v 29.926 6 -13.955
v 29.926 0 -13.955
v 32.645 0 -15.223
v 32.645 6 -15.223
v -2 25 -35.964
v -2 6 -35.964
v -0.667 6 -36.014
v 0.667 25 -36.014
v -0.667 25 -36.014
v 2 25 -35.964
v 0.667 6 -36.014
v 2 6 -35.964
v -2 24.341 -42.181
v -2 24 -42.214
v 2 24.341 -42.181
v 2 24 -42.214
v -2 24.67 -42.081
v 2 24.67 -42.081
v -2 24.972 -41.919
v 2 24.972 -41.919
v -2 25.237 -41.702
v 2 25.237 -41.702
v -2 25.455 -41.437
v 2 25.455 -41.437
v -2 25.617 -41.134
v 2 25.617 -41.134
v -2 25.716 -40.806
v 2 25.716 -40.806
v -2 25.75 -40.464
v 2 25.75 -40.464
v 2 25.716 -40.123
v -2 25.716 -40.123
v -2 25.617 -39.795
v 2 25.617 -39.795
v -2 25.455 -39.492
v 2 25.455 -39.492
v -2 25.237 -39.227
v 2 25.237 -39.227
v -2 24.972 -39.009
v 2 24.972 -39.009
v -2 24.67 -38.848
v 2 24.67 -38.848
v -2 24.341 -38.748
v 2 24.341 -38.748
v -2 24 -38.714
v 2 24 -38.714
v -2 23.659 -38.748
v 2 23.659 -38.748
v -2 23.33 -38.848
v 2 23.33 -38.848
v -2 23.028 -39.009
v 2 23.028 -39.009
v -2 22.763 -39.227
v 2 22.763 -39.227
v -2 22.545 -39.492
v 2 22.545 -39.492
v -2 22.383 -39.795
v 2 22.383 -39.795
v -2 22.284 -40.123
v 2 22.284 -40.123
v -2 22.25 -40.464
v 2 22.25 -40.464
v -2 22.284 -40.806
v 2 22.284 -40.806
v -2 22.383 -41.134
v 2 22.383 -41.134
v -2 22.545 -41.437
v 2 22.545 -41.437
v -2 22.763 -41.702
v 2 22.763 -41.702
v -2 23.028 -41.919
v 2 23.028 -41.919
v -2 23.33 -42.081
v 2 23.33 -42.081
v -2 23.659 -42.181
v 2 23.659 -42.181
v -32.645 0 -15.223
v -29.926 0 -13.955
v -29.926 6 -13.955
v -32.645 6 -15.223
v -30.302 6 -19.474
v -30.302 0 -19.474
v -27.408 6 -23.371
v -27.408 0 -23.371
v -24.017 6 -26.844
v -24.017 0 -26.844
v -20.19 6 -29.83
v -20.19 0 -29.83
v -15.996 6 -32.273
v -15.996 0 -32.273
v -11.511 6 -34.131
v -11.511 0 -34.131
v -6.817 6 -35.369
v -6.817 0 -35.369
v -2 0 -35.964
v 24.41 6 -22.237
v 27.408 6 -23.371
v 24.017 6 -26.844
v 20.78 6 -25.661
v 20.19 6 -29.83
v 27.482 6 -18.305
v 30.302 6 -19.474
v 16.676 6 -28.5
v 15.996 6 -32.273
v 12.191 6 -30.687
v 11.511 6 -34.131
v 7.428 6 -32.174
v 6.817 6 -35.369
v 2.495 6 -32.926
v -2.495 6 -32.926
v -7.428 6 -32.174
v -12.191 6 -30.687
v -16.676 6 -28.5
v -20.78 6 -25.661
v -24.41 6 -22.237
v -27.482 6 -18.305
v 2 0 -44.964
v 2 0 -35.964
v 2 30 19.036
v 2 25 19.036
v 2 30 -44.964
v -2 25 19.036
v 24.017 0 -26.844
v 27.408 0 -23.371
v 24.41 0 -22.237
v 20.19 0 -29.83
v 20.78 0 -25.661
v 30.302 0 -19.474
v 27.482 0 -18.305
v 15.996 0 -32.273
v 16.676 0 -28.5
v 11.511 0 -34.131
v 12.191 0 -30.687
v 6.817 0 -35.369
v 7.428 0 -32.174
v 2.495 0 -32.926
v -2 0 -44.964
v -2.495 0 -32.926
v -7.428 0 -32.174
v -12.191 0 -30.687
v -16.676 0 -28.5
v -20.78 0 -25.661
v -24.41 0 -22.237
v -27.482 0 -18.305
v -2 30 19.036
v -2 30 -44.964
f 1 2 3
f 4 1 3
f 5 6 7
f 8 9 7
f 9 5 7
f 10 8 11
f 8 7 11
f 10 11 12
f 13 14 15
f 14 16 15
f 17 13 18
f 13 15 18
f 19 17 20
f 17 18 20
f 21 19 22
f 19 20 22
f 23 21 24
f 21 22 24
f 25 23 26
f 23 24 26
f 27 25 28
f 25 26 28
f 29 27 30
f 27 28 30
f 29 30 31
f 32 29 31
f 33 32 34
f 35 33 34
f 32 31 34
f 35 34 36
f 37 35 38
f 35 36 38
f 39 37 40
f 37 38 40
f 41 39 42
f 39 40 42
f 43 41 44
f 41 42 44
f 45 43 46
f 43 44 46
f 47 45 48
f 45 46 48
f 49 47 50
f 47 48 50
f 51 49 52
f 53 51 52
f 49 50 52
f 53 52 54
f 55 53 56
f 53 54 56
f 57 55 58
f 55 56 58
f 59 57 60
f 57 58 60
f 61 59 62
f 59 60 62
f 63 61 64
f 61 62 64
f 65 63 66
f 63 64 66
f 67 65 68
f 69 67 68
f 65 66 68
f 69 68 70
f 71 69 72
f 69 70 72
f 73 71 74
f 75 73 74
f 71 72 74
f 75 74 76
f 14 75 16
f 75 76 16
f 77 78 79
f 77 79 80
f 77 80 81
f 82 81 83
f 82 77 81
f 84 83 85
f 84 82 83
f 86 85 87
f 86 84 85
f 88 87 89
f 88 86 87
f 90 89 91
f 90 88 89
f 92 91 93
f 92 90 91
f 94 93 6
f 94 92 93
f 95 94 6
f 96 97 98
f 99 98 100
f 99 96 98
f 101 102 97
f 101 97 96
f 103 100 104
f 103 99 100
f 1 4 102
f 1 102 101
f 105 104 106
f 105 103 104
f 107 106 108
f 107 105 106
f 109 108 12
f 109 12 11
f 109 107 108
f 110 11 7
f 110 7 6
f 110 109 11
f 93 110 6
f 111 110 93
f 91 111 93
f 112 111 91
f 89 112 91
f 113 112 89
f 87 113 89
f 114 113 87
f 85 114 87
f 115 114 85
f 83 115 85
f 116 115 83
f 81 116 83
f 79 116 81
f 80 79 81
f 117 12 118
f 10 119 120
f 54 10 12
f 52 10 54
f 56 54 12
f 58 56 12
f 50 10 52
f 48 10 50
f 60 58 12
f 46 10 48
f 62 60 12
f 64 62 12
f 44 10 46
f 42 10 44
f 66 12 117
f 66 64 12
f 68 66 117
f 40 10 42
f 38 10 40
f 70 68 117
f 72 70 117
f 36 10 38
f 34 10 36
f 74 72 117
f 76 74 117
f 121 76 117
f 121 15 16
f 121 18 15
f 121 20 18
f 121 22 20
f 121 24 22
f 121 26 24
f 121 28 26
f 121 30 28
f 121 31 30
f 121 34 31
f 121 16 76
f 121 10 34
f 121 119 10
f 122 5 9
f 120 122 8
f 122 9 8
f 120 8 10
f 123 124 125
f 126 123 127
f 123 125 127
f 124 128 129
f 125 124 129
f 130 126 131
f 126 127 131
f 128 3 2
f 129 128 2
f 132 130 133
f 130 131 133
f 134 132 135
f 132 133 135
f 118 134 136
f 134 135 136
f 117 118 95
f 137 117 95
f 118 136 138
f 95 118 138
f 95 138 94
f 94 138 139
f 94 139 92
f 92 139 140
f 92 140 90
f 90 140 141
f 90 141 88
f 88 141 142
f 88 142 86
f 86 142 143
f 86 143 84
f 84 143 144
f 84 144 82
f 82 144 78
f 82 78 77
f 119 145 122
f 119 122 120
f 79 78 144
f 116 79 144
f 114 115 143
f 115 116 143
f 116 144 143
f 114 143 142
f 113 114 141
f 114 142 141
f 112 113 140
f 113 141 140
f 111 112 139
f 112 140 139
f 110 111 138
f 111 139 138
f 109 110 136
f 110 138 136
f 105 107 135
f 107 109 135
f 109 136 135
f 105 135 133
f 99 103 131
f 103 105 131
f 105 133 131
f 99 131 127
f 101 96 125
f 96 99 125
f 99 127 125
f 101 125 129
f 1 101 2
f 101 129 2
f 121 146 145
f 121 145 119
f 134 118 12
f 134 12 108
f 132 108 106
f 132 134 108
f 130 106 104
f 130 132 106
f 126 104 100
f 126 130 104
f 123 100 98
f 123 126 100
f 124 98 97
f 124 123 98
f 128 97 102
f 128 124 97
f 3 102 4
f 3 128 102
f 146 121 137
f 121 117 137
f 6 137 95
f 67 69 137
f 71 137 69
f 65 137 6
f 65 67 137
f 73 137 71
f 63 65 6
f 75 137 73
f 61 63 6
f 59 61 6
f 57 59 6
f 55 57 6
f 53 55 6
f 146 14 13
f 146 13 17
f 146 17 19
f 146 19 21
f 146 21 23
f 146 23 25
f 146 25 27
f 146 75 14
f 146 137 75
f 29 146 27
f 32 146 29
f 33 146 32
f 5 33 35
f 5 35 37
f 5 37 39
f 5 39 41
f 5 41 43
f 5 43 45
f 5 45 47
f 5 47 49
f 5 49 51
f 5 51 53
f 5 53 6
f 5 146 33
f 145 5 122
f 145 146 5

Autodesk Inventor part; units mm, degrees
ref_plane "YZ Plane" through (0, 0, 0) normal (1, 0, 0) x (0, 1, 0)
ref_plane "XZ Plane" through (0, 0, 0) normal (0, 1, 0) x (-1, 0, 0)
ref_plane "XY Plane" through (0, 0, 0) normal (0, 0, 1) x (1, 0, 0)
sketch "Sketch1" plane through (0, 0, 0) normal (0, 1, 0) x (-1, 0, 0)
  arc A0 (-29.9263, -13.9549) -> (29.9263, -13.9549) centre (0, 0) ccw
  arc A1 (-32.6452, -15.2227) -> (32.6452, -15.2227) centre (0, 0) ccw
  line L0 (54.2691, 0) -> (-55.7933, 0) construction
  line L1 (29.9263, -13.9549) -> (32.6452, -15.2227)
  line L2 (-29.9263, -13.9549) -> (-32.6452, -15.2227)
  dimension "d0" = 66.04
  dimension "d1" = 3
  dimension "d2" = 25
  dimension "d3" = 25
extrude "Extrusion1" add sketch "Sketch1" along normal blind 6
sketch "Sketch2" plane through (0, 0, 0) normal (0, -1, 0) x (1, 0, 0)
  arc A0 (-32.6452, -15.2227) -> (32.6452, -15.2227) centre (0, 0) ccw projected
  line L0 (2, -35.9644) -> (2, -44.9644)
  line L1 (2, -44.9644) -> (-2, -44.9644)
  line L2 (-2, -44.9644) -> (-2, -35.9644)
  dimension "d6" = 9
  dimension "d7" = 2
  dimension "d8" = 2
extrude "Extrusion2" add sketch "Sketch2" against normal blind 30
sketch "Sketch3" plane through (2, 0, -35.9644) normal (1, 0, 0) x (0, 0, -1)
  circle A0 centre (4.5, 24) radius 1.75
  line L0 (9, 0) -> (9, 30) projected
  line L1 (0, 30) -> (9, 30) projected
  line L2 (9, 0) -> (0, 0) projected
  point P0 (-35.9644, 0)
  dimension "d11" = 3.5
  dimension "d12" = 4.5
  dimension "d16" = 24
extrude "Extrusion3" cut sketch "Sketch3" against normal blind 26
sketch "Sketch5" plane through (0, 30, 0) normal (0, 1, 0) x (1, 0, 0)
  line L0 (-2, 44.9644) -> (-2, 35.9644) projected
  line L1 (-2, 35.9644) -> (-2, -19.0356)
  line L2 (-2, -19.0356) -> (2, -19.0356)
  line L3 (2, -19.0356) -> (2, 35.9644)
  arc A0 (2, 35.9644) -> (-2, 35.9644) centre (0, 0) ccw projected
  dimension "d22" = 55
extrude "Extrusion5" add sketch "Sketch5" against normal blind 5
sketch "Sketch6" plane through (2, 0, -35.9644) normal (1, 0, 0) x (0, 0, -1)
  point P0 (-35.9644, 0)
properties part number "_3DPrint"
